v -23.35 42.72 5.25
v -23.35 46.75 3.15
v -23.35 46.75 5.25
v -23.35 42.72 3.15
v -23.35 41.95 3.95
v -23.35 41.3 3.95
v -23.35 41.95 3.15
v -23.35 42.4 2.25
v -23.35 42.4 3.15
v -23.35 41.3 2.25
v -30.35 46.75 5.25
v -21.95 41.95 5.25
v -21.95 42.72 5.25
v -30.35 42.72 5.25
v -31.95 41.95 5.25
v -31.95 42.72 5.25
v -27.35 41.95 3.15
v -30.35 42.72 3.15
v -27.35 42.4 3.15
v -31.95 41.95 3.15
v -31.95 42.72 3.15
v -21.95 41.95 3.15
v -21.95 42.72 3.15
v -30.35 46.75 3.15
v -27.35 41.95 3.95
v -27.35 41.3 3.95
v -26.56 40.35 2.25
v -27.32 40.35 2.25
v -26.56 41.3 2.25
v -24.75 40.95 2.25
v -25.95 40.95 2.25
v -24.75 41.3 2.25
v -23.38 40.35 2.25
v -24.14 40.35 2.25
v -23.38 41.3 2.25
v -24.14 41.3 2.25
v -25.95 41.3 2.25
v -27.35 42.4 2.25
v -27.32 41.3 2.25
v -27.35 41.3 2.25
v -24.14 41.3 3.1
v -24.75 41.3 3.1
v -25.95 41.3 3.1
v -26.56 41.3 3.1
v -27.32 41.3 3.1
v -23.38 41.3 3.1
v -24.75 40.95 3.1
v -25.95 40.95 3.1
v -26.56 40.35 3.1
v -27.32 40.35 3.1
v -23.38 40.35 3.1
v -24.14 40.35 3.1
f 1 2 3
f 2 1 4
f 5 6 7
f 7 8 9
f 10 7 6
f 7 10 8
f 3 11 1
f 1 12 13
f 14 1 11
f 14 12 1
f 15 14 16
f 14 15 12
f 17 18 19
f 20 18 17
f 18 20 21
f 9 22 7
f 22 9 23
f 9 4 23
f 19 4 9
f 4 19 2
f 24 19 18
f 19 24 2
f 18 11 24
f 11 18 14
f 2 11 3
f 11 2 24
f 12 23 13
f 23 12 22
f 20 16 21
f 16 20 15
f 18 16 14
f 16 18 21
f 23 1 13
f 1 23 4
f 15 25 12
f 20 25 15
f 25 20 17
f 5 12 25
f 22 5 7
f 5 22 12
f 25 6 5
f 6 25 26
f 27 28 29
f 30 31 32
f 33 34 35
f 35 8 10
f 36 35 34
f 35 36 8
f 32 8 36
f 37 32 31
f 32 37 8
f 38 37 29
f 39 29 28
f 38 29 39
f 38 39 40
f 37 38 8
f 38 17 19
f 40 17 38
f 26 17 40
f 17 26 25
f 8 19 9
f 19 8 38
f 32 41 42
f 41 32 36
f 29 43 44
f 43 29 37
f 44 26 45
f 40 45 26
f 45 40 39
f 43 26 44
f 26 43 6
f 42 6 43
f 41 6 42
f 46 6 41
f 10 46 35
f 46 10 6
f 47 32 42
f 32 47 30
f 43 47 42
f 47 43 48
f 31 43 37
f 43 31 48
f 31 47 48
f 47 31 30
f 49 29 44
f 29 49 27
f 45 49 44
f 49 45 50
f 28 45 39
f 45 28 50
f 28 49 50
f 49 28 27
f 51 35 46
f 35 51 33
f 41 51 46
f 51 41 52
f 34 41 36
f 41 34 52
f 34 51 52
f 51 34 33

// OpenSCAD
// Pixel Dash case datum in mm. Insert through the existing slot from inside.
// The two ears engage the fixed switch frame after the nominal 0.2 mm stroke.
module prism(x0, x1, y0, y1, z0, z1) {
    translate([x0, y0, z0]) cube([x1-x0, y1-y0, z1-z0]);
}

union() {
    // Thumb surface and guides clear the rounded corners of the slider slot.
    prism(-30.35, -23.35, 42.35, 46.75, 3.15, 5.25);
    // Internal flange retains the cap when the enclosure is assembled.
    prism(-31.95, -21.95, 41.95, 42.72, 3.15, 5.25);
    // Nose and shoulders share a transverse rib behind the board edge.
    prism(-27.35, -23.35, 41.30, 42.40, 2.25, 3.95);
    prism(-25.95, -24.75, 40.95, 41.65, 2.25, 3.10);
    prism(-27.32, -26.56, 40.35, 41.65, 2.25, 3.10);
    prism(-24.14, -23.38, 40.35, 41.65, 2.25, 3.10);
}
